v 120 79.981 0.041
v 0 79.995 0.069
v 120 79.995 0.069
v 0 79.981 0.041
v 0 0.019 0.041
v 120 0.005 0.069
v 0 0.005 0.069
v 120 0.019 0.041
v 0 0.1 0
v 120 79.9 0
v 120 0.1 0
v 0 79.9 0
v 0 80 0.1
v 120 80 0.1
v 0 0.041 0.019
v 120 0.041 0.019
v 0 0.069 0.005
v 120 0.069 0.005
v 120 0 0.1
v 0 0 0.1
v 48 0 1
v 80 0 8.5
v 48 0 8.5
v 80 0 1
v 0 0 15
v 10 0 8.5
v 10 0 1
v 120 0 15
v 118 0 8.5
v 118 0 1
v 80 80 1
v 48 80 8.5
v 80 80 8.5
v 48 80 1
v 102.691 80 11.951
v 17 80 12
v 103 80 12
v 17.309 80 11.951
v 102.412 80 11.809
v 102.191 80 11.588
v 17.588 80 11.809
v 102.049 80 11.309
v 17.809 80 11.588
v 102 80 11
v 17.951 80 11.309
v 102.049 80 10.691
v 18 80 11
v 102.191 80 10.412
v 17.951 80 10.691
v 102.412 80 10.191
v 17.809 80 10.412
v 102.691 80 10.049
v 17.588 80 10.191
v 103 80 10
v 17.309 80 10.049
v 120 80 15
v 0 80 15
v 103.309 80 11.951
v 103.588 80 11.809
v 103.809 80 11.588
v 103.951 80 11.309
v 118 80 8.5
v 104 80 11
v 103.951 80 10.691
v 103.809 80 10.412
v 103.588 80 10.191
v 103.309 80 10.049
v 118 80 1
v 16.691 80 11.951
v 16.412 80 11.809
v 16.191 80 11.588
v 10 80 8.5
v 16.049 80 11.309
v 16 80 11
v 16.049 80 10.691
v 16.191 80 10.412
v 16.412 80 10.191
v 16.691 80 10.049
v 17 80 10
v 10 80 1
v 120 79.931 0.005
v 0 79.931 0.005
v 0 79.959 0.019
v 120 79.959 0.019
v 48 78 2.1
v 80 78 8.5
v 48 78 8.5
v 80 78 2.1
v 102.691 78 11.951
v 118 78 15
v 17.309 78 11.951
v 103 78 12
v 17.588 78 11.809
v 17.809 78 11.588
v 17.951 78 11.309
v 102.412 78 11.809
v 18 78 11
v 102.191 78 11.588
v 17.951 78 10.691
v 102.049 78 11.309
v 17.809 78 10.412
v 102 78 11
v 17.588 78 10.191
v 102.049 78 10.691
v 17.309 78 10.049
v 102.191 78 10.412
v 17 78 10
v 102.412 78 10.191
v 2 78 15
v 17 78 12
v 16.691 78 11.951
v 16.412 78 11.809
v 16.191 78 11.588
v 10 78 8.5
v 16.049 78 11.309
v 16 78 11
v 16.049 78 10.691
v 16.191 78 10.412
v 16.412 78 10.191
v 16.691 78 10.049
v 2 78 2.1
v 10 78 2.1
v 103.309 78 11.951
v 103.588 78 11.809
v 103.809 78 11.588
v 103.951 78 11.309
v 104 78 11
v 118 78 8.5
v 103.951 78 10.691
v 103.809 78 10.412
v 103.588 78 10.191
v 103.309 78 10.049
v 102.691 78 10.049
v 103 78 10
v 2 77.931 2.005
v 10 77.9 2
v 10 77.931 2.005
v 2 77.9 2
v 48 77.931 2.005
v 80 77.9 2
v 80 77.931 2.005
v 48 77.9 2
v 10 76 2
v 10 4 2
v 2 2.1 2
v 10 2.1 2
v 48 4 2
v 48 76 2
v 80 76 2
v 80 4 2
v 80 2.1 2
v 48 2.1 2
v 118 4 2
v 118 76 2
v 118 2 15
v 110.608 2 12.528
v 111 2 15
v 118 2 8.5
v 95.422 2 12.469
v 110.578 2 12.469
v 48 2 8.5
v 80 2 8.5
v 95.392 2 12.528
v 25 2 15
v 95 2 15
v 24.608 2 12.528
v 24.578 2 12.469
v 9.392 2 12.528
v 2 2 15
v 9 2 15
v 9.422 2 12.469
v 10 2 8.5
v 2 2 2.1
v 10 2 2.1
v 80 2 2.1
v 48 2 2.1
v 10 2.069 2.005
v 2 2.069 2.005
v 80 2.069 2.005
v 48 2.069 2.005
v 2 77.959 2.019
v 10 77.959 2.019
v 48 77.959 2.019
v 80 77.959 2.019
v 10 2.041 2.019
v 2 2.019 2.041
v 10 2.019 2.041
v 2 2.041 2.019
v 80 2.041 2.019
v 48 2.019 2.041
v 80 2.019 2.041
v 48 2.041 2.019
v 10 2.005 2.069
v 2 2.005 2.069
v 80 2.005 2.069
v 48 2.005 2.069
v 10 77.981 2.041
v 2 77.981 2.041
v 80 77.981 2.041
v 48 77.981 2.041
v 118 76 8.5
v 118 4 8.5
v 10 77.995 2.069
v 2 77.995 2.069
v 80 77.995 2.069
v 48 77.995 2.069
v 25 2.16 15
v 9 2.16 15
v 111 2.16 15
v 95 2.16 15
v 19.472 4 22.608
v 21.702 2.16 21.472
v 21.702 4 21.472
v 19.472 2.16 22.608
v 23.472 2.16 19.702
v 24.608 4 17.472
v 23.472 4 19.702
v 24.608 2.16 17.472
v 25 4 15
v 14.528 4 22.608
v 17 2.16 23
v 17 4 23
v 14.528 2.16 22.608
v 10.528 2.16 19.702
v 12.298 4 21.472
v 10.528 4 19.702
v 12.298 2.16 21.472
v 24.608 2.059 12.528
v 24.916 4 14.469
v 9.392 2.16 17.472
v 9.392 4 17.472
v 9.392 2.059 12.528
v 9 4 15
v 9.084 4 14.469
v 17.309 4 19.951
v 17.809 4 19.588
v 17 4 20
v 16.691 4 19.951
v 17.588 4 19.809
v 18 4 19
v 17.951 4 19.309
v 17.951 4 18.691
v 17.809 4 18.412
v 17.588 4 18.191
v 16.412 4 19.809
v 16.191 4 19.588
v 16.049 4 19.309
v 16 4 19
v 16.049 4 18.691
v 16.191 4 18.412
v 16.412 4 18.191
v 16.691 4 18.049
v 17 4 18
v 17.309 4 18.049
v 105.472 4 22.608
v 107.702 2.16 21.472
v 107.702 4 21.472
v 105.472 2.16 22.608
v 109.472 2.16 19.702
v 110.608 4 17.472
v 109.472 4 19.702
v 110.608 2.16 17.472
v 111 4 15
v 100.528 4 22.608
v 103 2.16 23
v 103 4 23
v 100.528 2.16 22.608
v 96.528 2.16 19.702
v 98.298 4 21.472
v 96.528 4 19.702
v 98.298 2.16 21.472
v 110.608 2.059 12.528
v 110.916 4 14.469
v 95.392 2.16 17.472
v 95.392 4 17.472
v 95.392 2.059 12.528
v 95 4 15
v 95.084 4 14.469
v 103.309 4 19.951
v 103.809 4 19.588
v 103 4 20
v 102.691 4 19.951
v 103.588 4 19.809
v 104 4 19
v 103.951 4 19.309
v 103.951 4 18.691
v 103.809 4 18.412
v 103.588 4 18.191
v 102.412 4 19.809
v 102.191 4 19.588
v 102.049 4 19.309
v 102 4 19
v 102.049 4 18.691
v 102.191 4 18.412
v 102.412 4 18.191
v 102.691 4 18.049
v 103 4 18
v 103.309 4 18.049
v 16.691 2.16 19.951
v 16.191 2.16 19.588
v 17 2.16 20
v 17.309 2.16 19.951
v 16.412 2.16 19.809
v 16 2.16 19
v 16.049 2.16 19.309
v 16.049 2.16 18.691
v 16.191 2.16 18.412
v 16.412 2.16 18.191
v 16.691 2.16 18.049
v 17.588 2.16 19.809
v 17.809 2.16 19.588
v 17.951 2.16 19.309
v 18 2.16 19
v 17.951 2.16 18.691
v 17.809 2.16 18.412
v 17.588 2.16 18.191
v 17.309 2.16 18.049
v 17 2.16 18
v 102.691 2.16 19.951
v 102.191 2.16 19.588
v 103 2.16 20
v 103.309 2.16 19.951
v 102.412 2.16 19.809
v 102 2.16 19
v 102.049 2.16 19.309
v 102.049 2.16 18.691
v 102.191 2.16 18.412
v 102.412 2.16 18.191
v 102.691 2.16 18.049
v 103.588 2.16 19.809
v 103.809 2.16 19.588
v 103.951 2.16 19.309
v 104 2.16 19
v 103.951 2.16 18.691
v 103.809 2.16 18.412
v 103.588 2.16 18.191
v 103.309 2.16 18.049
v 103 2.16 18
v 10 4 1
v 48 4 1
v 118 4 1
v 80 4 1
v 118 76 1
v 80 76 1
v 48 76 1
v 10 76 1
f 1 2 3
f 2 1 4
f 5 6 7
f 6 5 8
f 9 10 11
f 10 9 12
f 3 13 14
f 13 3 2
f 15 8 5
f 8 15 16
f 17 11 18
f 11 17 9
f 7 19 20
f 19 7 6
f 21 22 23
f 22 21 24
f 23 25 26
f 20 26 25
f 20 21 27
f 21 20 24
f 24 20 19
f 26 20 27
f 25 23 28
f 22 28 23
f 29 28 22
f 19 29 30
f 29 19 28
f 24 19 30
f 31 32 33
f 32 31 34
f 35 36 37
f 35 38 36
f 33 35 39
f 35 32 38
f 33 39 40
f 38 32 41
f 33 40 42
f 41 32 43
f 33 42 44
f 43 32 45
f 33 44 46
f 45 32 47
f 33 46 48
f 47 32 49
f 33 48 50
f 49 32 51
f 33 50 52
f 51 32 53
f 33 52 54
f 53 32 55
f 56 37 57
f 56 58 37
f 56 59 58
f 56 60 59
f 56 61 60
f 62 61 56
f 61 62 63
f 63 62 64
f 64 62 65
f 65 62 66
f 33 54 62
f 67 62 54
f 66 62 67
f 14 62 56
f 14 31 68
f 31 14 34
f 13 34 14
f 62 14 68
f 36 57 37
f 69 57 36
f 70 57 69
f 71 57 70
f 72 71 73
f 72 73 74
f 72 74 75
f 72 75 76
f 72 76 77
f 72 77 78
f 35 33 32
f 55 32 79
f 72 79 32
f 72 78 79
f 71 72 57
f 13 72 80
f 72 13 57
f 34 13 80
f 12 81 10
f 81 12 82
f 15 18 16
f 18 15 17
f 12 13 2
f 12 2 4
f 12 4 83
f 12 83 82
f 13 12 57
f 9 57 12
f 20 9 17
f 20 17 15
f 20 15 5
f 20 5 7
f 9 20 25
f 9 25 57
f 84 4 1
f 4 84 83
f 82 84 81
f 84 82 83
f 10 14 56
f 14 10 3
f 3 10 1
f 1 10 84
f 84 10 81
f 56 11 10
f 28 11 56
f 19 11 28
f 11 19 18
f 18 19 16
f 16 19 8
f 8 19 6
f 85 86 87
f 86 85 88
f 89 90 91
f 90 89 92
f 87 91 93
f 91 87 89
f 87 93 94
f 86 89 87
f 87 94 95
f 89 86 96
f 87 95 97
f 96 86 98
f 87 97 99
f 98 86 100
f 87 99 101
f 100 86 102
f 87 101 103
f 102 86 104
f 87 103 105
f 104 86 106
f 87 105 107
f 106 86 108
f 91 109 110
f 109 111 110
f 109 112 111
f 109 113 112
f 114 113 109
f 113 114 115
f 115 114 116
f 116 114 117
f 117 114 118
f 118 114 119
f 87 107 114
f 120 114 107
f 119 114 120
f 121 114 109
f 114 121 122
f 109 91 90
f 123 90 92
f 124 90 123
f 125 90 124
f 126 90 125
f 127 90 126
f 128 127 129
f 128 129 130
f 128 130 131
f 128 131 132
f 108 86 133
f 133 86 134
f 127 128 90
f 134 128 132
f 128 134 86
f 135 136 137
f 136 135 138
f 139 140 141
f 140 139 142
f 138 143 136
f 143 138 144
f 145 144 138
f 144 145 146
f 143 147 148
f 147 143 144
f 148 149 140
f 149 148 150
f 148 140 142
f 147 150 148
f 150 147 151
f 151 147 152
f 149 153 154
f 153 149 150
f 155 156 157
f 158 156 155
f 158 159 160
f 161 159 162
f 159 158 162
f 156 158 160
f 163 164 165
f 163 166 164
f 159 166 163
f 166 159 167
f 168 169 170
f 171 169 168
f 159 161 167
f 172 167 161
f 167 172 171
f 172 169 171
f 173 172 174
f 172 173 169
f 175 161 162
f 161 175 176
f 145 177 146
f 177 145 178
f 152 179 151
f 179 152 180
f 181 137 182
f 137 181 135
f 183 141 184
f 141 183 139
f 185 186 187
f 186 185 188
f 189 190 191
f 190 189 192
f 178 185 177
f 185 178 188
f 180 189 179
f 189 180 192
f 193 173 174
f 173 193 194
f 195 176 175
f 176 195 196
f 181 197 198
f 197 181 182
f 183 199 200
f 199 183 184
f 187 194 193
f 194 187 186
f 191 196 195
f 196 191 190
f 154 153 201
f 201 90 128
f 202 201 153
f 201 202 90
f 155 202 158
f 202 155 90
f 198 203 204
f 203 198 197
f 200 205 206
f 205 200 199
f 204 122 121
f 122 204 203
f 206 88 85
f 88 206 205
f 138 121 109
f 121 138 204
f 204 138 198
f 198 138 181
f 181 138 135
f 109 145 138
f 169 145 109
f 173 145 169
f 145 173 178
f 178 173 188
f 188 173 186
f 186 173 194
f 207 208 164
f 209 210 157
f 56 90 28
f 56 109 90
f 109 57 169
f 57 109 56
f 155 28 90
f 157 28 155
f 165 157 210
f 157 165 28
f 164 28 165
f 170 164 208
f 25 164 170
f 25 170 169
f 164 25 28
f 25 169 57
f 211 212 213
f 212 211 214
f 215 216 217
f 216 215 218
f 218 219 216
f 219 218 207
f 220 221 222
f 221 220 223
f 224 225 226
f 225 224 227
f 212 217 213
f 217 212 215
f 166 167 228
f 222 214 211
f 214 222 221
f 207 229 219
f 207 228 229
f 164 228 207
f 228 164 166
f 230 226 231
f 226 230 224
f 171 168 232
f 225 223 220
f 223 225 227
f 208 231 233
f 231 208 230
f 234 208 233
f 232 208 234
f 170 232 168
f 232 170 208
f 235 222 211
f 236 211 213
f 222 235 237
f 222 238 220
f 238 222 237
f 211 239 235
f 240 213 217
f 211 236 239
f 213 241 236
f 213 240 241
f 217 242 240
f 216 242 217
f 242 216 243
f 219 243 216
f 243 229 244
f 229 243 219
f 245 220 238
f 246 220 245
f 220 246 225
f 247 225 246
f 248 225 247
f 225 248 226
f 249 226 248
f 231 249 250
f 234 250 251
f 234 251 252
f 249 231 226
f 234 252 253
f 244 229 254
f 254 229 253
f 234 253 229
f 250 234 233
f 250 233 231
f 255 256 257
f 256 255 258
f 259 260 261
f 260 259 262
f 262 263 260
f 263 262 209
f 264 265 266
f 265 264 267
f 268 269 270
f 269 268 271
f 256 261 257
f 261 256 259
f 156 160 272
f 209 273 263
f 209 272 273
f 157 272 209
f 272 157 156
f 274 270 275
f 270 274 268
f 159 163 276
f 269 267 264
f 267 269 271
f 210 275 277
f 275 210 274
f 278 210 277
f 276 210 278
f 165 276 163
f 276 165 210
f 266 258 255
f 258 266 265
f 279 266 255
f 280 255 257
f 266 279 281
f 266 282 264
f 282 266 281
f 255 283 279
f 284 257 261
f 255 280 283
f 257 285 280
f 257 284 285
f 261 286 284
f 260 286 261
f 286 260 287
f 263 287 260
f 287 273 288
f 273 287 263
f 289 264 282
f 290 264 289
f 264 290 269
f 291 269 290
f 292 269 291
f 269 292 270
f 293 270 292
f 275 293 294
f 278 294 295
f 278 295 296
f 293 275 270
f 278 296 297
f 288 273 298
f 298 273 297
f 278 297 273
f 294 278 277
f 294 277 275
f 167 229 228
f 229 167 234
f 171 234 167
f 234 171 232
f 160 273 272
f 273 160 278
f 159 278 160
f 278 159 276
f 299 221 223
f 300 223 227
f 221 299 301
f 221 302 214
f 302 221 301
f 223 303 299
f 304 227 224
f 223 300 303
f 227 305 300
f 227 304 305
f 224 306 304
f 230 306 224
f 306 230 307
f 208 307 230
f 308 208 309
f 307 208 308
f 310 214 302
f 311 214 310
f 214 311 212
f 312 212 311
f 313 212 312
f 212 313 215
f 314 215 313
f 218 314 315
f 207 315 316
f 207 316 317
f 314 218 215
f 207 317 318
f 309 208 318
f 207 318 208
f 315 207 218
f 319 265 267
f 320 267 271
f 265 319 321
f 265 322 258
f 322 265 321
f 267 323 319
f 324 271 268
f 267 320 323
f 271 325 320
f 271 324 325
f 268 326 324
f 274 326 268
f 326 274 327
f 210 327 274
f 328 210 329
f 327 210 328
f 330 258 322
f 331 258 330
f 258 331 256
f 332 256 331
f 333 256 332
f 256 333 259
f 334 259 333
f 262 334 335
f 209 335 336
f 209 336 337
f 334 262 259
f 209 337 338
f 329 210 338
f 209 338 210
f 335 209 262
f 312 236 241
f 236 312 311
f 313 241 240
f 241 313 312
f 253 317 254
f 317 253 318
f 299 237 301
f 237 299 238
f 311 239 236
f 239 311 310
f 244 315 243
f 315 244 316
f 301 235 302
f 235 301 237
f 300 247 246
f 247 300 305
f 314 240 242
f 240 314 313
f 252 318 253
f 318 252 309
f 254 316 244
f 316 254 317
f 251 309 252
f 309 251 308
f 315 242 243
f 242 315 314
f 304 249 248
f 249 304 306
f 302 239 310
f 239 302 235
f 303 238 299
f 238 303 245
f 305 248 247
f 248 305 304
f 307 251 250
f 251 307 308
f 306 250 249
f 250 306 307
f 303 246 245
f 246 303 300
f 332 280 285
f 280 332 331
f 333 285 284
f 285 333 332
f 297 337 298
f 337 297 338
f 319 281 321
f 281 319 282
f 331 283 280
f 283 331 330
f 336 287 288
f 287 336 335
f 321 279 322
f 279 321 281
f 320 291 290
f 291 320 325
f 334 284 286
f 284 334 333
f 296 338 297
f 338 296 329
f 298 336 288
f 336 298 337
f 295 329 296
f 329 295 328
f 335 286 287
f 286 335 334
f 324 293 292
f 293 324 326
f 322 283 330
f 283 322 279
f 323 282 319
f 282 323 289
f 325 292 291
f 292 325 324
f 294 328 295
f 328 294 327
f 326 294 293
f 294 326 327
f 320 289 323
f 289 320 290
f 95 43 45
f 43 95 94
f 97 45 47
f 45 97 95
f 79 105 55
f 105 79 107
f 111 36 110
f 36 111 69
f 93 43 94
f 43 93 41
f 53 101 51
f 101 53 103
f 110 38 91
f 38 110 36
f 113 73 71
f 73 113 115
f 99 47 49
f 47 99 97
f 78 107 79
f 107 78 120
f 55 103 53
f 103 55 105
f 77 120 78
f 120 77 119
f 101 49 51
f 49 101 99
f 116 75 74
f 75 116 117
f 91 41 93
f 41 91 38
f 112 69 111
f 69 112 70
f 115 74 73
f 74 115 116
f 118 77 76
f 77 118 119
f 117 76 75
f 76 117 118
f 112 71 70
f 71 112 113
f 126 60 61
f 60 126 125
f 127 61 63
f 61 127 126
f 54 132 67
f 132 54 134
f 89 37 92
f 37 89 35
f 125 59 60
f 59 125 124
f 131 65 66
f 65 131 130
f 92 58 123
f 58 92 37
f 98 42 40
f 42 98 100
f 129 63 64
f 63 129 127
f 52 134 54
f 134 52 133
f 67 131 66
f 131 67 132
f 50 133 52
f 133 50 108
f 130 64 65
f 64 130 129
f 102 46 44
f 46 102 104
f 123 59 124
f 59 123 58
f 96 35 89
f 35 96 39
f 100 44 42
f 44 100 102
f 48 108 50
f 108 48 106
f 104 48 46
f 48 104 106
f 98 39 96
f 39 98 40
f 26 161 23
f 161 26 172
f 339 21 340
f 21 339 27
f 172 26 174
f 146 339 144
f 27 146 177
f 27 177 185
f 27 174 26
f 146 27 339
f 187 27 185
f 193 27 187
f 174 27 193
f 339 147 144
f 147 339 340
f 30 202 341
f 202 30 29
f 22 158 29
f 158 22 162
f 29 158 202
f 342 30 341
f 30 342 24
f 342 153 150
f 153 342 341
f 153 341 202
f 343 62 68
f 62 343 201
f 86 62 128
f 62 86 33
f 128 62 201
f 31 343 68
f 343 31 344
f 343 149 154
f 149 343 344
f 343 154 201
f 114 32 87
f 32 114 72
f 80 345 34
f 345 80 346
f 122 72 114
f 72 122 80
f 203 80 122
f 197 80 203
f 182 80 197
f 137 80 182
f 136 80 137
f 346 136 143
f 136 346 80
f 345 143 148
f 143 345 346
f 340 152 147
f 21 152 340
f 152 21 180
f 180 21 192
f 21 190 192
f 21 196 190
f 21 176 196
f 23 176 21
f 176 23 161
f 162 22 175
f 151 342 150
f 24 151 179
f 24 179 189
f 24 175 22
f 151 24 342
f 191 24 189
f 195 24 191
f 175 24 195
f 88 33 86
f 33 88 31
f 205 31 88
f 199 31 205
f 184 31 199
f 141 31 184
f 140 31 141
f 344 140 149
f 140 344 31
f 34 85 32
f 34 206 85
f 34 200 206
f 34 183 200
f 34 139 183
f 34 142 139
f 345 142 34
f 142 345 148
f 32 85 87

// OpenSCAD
$fn=20;

/******     Parameter lijst     ******/
/*************************************/
//Afmetingen doos
lengte = 120;
breedte = 80;
hoogte = 30;
dikte = 2;

//Fillet waarde
//De Fillet waarde zal voor kleine waarden scherpe hoeken geven
//en voor grote waarden ronde hoeken. Het bereik ligt tussen 0,1 en 12.
fillet = 0.1;

//Ventilatiegaten
ventilatiegatenBoven = 1;
ventilatiegatenOnder = 8;




//Deze module zal een balk produceren en afhankelijk van de fillet waarde
//zullen de hoeken minder of meer afgerond zijn.
module ronding($a=lengte, $b=breedte, $c=hoogte) {
    translate([0,fillet, fillet]){
        minkowski() {
            cube([$a-(lengte/2), $b-(2*fillet), $c-(2*fillet)], center = false);
            rotate([0,90,0]) {
                cylinder(r=fillet, h=lengte/2, center = false);
            }
        }
    }
}

//Deze module zal de elementaire behuizing produceren zonder ventilatiegaten, pootjes, ...
module doos() {
    //De 0.000001 is toegevoegd om de bug in OpenSCAD te elimineren
    dikte = dikte*2+0.000001;
    difference() {
        difference() {
            union(){
                //Het uithollen van de doos
                difference(){
                    ronding();
                    translate([dikte/2, dikte/2, dikte/2]) {
                        ronding($a=lengte-dikte, $b=breedte-dikte, $c=hoogte-dikte);
                    }
                }
            }
         //Het afsnijden van de top opdat enkel de randen overblijven
         translate([-dikte, -dikte, hoogte/2]){
             cube([lengte+dikte, breedte+dikte, hoogte], center=false);
         }
     }
 }
 }

 module bevestiging() {
     dikte = dikte*2;
     difference() {
     union() {
         translate([3*dikte + 5, dikte, hoogte/2]) {
             rotate([90,0,0]){
                 
             cylinder(d=16, dikte/2);
             }
         }

         translate([lengte-((3*dikte) + 5), dikte, hoogte/2]) {
             rotate([90,0,0]){
             cylinder(d=16, dikte/2);
             }
         }
     }

         translate([4,dikte+fillet, hoogte/2-57]){
             rotate([45,0,0]){
             cube([lengte, 40, 40]);
             }
         }

         translate([0,-(dikte*1.46), hoogte/2]){
             cube([lengte, dikte*2, 10]);
             }
         }
     }

module gaten() {
    dikte = dikte*2;
     union() {

                translate([3*dikte+5,20,hoogte/2+4]){
                    rotate([90,0,0]){
                    cylinder(d=2,20);
                    }
                }
                translate([lengte-((3*dikte)+5),20,hoogte/2+4]){
                    rotate([90,0,0]){
                    cylinder(d=2,20);
                    }
                }
                translate([3*dikte+5,breedte+5,hoogte/2-4]){
                    rotate([90,0,0]){
                    cylinder(d=2,20);
                    }
                }
                translate([lengte-((3*dikte)+5),breedte+5,hoogte/2-4]){
                    rotate([90,0,0]){
                    cylinder(d=2,20);
                    }
                }
            }
        }




 module ventilatiegaten(top) {
     afmeting = dikte*2;

     union() {
         if(top == 1) {
             for(i=[0:dikte:lengte/4]){
             translate([10+i,0,1]){
                    cube([ventilatiegatenBoven,afmeting,hoogte/4]);
                    }
                    translate([(lengte-10) - i,0,1]){
                    cube([ventilatiegatenBoven,afmeting,hoogte/4]);
                    }
                    translate([(lengte-10) - i,breedte-afmeting,1]){
                    cube([ventilatiegatenBoven,afmeting,hoogte/4]);
                    }
                    translate([10+i,breedte-afmeting,1]){
                    cube([ventilatiegatenBoven,afmeting,hoogte/4]);
                    }
                }

     }

     if(top == 0) {

         for(i=[0:dikte:lengte/4]){
             translate([10+i,0,1]){
                    cube([ventilatiegatenOnder,afmeting,hoogte/4]);
                    }
                    translate([(lengte-10) - i,0,1]){
                    cube([ventilatiegatenOnder,afmeting,hoogte/4]);
                    }
                    translate([(lengte-10) - i,breedte-afmeting,1]){
                    cube([ventilatiegatenOnder,afmeting,hoogte/4]);
                    }
                    translate([10+i,breedte-afmeting,1]){
                    cube([ventilatiegatenOnder,afmeting,hoogte/4]);
                    }
                }

     }
 }









}

//ronding();
//doos();
//ventilatiegaten(0);

//bevestiging();

difference() {
    difference() {
        union() {
            doos();
            bevestiging();


        }

    }
    gaten();
    ventilatiegaten(0);
}


  //doos();
  //bevestiging();
//doos();
//bevestiging();
